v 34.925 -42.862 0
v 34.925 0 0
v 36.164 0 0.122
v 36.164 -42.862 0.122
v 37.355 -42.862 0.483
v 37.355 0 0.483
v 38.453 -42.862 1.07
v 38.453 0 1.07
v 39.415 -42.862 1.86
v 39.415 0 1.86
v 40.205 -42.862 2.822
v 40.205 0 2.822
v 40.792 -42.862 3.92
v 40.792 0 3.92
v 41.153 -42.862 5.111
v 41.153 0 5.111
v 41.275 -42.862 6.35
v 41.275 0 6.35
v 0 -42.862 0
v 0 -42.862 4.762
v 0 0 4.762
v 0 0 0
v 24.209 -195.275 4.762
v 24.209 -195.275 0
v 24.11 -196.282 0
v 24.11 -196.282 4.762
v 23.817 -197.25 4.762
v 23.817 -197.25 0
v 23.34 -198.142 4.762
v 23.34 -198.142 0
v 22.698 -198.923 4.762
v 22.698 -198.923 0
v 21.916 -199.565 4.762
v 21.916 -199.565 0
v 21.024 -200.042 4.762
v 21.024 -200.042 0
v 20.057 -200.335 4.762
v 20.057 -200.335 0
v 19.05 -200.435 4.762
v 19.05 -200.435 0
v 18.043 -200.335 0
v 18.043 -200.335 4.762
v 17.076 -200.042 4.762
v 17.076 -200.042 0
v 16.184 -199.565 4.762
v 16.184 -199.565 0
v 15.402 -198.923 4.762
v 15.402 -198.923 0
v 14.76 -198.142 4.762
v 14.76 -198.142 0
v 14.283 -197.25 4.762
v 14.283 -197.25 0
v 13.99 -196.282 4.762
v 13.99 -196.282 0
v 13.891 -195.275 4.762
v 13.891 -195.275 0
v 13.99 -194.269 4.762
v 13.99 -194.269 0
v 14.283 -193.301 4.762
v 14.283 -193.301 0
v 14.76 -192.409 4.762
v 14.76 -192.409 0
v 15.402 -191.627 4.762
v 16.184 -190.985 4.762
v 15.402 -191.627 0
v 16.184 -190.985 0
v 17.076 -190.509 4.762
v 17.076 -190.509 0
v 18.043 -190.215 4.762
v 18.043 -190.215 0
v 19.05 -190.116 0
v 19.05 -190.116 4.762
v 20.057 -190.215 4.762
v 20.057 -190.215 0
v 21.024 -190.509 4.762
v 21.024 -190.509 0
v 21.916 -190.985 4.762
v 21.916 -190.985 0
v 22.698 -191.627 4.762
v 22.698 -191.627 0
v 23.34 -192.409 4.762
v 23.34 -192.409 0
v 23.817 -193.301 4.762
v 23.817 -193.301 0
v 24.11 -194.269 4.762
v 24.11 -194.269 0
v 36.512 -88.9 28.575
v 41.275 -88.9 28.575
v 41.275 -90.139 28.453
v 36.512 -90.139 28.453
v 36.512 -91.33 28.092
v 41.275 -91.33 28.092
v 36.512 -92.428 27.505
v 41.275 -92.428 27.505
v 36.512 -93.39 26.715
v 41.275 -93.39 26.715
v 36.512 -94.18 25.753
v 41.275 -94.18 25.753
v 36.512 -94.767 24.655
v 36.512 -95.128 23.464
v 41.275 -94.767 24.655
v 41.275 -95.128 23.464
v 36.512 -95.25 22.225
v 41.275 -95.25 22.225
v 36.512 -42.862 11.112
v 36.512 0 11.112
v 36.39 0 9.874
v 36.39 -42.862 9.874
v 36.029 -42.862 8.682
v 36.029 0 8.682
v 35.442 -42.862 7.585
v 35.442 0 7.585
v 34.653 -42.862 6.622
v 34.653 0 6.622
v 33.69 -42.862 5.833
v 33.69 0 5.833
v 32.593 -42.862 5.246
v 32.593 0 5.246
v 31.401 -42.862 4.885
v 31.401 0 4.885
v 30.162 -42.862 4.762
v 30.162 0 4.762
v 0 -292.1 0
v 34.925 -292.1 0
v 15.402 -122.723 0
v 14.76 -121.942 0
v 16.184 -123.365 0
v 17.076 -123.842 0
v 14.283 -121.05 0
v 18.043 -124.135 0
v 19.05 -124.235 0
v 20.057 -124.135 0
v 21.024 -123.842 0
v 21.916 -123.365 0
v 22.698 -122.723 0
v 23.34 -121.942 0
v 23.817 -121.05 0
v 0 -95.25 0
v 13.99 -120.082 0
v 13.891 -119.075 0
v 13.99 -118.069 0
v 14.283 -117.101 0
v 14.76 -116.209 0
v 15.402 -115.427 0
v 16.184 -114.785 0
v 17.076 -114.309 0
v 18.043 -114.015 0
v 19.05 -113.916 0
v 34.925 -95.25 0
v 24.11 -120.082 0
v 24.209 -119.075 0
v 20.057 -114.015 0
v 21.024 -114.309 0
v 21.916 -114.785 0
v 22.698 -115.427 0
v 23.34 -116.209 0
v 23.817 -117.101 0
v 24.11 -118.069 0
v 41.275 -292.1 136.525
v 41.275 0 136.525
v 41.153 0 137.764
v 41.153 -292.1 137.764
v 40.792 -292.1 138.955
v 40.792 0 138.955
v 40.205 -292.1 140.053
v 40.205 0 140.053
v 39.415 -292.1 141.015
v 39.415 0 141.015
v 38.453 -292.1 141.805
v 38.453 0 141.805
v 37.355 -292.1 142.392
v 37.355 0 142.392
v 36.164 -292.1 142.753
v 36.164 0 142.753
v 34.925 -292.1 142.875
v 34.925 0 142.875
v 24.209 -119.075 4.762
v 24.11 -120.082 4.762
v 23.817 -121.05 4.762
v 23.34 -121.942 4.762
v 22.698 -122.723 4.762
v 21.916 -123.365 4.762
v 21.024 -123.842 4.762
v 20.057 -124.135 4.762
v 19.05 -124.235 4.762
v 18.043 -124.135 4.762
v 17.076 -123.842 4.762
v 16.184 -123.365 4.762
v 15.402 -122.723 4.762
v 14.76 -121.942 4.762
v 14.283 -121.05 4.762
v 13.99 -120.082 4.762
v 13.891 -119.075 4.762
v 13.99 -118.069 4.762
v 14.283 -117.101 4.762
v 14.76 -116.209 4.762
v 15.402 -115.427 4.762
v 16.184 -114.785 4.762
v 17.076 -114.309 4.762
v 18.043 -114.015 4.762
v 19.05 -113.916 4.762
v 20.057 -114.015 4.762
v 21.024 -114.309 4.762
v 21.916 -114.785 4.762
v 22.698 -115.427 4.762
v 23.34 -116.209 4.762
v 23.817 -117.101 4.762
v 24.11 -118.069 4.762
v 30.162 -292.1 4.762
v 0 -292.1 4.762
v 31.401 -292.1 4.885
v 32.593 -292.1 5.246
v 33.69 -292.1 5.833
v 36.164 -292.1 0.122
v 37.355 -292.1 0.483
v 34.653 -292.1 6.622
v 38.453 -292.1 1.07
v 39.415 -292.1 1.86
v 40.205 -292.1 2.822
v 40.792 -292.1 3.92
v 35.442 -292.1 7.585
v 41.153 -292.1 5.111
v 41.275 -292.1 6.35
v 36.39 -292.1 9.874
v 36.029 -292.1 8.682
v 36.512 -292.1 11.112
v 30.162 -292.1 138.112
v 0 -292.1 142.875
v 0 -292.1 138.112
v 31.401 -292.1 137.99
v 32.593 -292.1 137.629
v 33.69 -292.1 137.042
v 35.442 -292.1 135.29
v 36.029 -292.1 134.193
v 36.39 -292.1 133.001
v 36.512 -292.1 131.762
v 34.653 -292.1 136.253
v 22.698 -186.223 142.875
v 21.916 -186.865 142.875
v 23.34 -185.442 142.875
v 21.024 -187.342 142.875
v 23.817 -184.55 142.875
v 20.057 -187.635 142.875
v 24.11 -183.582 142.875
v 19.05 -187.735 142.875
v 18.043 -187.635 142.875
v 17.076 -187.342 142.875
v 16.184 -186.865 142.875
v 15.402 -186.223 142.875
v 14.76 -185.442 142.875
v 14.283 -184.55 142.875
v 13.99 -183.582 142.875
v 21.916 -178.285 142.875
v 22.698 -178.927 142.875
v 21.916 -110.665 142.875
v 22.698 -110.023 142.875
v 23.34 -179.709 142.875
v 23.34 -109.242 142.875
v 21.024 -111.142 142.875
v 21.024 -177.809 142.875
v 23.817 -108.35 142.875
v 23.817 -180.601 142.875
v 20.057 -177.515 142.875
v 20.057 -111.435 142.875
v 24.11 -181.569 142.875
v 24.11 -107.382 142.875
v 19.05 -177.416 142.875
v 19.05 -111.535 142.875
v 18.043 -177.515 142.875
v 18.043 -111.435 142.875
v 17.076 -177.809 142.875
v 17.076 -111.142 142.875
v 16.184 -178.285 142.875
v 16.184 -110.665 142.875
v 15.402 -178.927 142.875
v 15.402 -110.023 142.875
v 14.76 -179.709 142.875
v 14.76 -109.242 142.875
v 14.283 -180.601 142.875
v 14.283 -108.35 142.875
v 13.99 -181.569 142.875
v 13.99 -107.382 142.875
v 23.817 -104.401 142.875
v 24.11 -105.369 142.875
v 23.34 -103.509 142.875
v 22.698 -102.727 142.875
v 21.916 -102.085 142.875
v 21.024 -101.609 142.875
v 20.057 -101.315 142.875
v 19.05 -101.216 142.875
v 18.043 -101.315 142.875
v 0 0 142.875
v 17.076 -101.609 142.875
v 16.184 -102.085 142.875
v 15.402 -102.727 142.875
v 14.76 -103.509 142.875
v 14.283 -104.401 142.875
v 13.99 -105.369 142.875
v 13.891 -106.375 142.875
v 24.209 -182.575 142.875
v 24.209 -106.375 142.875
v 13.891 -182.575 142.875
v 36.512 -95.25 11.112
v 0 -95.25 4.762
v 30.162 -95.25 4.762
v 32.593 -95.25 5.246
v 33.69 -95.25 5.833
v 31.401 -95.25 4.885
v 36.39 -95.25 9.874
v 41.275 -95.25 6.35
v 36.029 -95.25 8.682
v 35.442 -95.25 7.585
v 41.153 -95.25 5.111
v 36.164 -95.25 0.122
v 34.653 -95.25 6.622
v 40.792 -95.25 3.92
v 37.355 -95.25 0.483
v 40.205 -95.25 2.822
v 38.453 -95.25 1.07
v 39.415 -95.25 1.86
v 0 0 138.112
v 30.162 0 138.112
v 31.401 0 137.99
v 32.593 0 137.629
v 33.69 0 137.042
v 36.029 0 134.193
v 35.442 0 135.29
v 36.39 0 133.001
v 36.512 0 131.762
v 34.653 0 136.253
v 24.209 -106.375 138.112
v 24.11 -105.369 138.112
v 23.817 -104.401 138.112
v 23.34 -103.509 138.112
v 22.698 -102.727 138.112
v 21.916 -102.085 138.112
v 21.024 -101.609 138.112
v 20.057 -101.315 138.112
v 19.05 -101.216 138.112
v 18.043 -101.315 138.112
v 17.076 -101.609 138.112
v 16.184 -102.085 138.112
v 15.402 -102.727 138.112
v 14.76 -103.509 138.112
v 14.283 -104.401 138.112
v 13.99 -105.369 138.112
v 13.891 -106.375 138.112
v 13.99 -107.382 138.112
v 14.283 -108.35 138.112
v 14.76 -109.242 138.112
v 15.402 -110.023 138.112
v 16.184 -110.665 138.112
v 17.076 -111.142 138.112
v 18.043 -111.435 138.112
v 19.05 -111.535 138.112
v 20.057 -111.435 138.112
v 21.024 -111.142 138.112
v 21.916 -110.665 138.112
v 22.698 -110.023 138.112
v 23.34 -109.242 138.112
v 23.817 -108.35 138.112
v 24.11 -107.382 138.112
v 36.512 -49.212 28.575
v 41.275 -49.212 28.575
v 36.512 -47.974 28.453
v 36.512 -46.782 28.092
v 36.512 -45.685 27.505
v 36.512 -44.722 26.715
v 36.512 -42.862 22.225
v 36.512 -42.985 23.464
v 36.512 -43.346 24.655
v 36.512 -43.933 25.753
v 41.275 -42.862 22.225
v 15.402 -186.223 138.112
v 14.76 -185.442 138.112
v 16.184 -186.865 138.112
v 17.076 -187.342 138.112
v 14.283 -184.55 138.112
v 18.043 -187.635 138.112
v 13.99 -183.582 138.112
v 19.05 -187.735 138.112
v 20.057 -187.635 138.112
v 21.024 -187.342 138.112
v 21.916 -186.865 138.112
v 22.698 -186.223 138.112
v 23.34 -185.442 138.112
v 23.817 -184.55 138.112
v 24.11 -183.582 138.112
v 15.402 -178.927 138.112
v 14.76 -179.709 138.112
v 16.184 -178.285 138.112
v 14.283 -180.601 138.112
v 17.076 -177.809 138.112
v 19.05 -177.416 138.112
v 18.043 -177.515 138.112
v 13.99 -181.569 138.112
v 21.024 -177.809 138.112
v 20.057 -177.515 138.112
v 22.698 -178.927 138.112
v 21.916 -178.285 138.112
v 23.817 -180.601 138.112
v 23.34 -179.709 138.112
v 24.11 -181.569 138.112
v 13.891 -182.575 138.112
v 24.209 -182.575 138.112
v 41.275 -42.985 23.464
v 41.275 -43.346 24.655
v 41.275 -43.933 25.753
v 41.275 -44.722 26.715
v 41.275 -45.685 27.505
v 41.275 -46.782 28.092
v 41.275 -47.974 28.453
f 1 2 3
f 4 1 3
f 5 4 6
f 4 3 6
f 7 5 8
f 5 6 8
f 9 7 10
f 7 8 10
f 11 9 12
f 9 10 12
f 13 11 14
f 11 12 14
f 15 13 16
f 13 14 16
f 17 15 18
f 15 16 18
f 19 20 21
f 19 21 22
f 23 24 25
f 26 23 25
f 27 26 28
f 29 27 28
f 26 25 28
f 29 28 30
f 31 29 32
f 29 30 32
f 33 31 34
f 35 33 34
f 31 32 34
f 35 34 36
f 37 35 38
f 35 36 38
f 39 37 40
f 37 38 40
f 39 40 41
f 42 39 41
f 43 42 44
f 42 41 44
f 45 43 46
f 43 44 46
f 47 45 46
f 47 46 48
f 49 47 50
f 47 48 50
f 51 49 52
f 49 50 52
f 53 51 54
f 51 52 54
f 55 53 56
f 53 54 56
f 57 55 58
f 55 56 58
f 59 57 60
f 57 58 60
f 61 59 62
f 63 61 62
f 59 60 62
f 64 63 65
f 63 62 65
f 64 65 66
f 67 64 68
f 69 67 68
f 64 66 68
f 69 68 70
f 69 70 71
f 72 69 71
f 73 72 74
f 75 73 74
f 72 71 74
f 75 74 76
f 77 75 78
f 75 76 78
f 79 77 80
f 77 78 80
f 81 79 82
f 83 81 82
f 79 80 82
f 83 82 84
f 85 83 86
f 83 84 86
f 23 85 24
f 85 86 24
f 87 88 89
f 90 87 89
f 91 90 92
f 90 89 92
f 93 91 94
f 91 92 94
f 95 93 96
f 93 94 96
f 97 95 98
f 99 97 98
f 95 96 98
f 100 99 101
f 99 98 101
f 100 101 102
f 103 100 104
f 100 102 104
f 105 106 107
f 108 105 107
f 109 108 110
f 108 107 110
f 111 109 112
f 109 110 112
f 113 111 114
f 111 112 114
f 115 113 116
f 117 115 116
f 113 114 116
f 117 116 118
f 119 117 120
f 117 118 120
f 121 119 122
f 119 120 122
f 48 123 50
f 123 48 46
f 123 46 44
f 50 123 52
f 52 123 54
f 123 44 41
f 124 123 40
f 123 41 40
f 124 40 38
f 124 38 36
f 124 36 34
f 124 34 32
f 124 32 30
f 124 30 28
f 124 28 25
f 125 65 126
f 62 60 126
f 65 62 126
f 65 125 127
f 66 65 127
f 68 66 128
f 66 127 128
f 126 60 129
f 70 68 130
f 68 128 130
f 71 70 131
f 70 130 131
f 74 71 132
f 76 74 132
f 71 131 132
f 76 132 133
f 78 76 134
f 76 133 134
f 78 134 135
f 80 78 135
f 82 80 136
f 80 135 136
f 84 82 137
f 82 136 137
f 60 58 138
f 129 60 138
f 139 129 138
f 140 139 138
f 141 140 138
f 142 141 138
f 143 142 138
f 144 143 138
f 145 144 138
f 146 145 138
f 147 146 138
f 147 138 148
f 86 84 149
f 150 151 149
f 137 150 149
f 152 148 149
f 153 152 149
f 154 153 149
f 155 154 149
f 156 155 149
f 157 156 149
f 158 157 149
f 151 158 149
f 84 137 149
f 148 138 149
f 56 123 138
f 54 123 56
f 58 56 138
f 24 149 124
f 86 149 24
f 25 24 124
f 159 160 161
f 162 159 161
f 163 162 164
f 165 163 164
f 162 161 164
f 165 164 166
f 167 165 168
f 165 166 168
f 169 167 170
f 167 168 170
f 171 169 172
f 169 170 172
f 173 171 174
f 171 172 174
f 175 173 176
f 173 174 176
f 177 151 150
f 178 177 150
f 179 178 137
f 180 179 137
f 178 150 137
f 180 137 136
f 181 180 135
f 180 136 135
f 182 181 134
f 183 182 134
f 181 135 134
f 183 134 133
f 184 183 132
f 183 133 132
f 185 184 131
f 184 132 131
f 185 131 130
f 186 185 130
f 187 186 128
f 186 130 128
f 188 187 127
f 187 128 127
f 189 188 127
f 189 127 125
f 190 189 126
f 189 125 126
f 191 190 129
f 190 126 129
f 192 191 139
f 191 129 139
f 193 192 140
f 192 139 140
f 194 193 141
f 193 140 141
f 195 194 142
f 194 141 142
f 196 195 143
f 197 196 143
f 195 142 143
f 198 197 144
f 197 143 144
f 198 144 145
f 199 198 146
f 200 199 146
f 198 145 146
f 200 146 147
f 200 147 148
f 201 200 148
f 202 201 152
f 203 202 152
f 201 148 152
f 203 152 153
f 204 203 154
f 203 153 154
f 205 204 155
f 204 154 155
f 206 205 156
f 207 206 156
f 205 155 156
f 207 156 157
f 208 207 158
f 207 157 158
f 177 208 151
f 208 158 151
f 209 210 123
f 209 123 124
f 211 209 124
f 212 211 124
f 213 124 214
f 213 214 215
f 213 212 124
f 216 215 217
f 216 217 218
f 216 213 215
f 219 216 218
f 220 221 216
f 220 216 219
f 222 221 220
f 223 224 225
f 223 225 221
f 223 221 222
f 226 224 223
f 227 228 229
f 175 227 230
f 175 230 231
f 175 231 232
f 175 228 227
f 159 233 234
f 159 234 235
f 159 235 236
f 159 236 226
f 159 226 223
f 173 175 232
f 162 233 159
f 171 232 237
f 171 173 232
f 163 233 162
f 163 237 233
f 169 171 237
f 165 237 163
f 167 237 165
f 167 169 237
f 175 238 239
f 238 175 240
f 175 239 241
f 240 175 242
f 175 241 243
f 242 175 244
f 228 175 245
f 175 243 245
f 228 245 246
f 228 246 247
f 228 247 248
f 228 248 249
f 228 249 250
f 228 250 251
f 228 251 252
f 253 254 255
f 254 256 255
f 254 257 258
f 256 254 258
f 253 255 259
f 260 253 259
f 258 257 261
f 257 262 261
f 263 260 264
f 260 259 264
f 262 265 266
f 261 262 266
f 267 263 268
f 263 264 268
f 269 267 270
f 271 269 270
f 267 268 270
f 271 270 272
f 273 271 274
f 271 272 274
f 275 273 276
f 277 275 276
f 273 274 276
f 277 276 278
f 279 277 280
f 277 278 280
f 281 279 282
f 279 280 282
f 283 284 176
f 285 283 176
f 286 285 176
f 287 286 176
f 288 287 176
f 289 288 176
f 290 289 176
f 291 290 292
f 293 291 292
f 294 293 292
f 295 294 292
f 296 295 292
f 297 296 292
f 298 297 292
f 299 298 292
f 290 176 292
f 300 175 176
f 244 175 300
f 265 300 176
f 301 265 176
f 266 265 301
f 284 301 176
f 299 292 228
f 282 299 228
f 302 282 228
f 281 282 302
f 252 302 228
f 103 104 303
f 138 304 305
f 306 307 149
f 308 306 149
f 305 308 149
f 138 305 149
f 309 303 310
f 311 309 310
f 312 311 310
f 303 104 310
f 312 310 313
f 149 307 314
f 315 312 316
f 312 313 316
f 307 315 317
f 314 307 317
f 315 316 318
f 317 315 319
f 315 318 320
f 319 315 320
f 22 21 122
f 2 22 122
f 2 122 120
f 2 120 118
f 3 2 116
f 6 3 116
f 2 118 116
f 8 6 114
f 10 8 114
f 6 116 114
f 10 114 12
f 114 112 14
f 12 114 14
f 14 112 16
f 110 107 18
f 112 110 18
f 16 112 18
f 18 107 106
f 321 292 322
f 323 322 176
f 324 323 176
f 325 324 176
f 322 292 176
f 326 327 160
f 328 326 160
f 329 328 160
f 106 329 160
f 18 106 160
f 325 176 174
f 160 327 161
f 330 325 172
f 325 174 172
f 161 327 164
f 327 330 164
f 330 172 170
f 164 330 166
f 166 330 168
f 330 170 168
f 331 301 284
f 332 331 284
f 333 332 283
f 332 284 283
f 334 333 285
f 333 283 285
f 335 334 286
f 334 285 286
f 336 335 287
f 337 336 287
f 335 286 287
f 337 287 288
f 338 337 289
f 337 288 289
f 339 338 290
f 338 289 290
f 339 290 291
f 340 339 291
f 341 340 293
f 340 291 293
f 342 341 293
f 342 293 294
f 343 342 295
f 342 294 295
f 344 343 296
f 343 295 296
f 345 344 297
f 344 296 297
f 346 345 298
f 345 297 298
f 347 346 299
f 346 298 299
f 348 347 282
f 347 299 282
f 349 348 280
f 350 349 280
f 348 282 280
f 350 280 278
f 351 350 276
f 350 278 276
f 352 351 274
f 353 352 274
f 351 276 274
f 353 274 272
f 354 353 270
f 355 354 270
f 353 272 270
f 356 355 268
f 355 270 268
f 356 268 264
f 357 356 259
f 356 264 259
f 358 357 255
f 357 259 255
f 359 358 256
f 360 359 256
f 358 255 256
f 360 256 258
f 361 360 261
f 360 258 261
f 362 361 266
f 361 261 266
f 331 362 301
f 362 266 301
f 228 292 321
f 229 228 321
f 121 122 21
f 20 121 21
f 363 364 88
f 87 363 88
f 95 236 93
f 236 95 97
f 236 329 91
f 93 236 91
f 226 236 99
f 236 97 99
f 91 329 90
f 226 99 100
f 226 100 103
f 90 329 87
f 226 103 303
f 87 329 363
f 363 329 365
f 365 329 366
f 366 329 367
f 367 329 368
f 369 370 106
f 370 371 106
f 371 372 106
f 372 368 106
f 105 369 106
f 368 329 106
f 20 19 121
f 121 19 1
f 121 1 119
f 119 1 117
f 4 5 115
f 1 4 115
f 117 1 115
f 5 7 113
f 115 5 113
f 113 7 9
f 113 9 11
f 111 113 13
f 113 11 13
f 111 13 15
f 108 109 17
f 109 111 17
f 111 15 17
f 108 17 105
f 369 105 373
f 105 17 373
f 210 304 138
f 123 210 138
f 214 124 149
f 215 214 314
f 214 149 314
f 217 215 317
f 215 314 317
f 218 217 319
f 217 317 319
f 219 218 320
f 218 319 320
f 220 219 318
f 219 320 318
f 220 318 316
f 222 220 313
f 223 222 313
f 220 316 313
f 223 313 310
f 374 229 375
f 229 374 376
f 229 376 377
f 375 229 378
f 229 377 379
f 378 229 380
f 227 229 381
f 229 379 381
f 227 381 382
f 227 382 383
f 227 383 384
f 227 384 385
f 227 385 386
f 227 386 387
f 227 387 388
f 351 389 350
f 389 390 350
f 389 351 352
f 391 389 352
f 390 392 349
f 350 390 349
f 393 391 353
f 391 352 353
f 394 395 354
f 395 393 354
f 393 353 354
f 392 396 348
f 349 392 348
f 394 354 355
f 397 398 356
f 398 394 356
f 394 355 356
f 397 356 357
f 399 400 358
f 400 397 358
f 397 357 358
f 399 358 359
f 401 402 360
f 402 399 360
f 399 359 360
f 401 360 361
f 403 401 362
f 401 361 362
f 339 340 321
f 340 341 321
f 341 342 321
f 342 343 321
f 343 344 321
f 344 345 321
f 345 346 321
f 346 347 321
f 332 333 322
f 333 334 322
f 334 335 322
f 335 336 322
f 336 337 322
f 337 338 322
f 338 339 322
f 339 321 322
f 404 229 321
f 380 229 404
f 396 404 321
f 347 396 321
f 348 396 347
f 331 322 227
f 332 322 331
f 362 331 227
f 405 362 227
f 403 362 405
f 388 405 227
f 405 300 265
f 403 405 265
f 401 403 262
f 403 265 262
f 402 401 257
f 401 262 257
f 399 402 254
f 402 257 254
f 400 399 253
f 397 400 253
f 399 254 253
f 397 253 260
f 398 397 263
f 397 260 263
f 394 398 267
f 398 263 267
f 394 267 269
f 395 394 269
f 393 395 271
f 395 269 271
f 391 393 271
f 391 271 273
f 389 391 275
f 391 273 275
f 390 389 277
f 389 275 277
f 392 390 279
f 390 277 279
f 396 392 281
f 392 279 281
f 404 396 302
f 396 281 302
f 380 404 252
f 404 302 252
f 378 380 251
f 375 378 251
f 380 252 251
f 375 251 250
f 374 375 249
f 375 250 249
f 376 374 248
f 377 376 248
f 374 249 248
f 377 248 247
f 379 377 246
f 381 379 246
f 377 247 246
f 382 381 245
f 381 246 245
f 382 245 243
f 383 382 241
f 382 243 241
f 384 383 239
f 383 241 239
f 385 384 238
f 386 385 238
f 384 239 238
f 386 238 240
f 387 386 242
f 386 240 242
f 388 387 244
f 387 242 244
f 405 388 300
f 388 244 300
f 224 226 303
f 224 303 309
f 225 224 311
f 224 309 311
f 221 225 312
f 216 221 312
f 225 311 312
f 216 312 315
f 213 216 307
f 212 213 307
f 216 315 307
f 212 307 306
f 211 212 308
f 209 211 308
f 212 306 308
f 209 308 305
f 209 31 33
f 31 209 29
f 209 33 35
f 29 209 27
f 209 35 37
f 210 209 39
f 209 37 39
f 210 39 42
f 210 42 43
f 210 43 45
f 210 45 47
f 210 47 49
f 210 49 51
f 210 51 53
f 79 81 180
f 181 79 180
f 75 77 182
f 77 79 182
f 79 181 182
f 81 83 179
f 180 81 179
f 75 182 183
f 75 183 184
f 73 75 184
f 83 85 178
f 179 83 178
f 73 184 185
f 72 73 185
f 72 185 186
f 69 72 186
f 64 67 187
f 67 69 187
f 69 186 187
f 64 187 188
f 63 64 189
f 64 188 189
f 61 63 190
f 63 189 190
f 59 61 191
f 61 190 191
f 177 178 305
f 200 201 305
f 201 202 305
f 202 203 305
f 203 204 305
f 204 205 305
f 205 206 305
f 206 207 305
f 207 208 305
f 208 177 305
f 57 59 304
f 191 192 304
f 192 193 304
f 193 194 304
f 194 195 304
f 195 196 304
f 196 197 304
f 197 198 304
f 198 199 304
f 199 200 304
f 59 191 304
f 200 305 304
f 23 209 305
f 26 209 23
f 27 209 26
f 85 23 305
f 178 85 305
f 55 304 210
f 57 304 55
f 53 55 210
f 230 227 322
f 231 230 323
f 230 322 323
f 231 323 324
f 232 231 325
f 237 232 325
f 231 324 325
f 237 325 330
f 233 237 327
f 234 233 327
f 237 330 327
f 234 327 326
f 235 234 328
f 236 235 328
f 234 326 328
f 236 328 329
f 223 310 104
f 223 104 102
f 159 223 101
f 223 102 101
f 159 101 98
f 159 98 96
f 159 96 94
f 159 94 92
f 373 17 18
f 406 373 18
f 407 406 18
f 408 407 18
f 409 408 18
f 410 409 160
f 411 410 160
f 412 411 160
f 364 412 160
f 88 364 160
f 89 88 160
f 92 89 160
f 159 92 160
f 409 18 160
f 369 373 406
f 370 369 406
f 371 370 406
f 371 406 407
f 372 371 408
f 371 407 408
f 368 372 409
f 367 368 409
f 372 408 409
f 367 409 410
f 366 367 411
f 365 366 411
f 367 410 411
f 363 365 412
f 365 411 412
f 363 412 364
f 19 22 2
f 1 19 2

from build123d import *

# Parameters (mm, degrees)
F1_DEPTH = 292.1
F3_DEPTH = 41.276
F4_R     = 5.159375
F5_DEPTH = 4.7625
F6_R     = 5.159375
F7_DEPTH = 4.7625


with BuildPart() as f1:
    # F0 (on Front) → F1 (new body)
    with BuildSketch(Plane.XZ):
        with BuildLine():
            Line((0, 4.7625), (0, 0))
            Line((0, 0), (34.925, 0))
            ThreePointArc((34.925, 0), (39.415128, 1.859872), (41.275, 6.35))
            Line((41.275, 6.35), (41.275, 136.525))
            ThreePointArc((41.275, 136.525), (39.415128, 141.015128), (34.925, 142.875))
            Line((34.925, 142.875), (0, 142.875))
            Line((0, 142.875), (0, 138.1125))
            Line((0, 138.1125), (30.1625, 138.1125))
            ThreePointArc((30.1625, 138.1125), (34.652628, 136.252628), (36.5125, 131.7625))
            Line((36.5125, 131.7625), (36.5125, 11.1125))
            ThreePointArc((36.5125, 11.1125), (34.652628, 6.622372), (30.1625, 4.7625))
            Line((30.1625, 4.7625), (0, 4.7625))
        make_face()
    extrude(amount=F1_DEPTH)

    # F2 (on face) → F3 (cut, through all)
    with BuildSketch(Plane.YZ.offset(41.275)):
        with BuildLine():
            Line((-95.25, 22.225), (-95.25, 0))
            Line((-95.25, 0), (-42.8625, 0))
            Line((-42.8625, 0), (-42.8625, 22.225))
            ThreePointArc((-42.8625, 22.225), (-44.722372, 26.715128), (-49.2125, 28.575))
            Line((-49.2125, 28.575), (-88.9, 28.575))
            ThreePointArc((-88.9, 28.575), (-93.390128, 26.715128), (-95.25, 22.225))
        make_face()
    extrude(amount=-F3_DEPTH, mode=Mode.SUBTRACT)

    # F4 (on face) → F5 (cut, through all)
    with BuildSketch(Plane.XY.offset(142.875)):
        with Locations((19.05, -106.3752)):
            Circle(F4_R)
        with Locations((19.05, -182.5752)):
            Circle(F4_R)
    extrude(amount=-F5_DEPTH, mode=Mode.SUBTRACT)

    # F6 (on face) → F7 (cut, through all)
    with BuildSketch(Plane(origin=(0, 0, 0), x_dir=(1, 0, 0), z_dir=(0, 0, -1))):
        with Locations((19.05, 119.0752)):
            Circle(F6_R)
        with Locations((19.05, 195.2752)):
            Circle(F6_R)
    extrude(amount=-F7_DEPTH, mode=Mode.SUBTRACT)


solid = f1.part
